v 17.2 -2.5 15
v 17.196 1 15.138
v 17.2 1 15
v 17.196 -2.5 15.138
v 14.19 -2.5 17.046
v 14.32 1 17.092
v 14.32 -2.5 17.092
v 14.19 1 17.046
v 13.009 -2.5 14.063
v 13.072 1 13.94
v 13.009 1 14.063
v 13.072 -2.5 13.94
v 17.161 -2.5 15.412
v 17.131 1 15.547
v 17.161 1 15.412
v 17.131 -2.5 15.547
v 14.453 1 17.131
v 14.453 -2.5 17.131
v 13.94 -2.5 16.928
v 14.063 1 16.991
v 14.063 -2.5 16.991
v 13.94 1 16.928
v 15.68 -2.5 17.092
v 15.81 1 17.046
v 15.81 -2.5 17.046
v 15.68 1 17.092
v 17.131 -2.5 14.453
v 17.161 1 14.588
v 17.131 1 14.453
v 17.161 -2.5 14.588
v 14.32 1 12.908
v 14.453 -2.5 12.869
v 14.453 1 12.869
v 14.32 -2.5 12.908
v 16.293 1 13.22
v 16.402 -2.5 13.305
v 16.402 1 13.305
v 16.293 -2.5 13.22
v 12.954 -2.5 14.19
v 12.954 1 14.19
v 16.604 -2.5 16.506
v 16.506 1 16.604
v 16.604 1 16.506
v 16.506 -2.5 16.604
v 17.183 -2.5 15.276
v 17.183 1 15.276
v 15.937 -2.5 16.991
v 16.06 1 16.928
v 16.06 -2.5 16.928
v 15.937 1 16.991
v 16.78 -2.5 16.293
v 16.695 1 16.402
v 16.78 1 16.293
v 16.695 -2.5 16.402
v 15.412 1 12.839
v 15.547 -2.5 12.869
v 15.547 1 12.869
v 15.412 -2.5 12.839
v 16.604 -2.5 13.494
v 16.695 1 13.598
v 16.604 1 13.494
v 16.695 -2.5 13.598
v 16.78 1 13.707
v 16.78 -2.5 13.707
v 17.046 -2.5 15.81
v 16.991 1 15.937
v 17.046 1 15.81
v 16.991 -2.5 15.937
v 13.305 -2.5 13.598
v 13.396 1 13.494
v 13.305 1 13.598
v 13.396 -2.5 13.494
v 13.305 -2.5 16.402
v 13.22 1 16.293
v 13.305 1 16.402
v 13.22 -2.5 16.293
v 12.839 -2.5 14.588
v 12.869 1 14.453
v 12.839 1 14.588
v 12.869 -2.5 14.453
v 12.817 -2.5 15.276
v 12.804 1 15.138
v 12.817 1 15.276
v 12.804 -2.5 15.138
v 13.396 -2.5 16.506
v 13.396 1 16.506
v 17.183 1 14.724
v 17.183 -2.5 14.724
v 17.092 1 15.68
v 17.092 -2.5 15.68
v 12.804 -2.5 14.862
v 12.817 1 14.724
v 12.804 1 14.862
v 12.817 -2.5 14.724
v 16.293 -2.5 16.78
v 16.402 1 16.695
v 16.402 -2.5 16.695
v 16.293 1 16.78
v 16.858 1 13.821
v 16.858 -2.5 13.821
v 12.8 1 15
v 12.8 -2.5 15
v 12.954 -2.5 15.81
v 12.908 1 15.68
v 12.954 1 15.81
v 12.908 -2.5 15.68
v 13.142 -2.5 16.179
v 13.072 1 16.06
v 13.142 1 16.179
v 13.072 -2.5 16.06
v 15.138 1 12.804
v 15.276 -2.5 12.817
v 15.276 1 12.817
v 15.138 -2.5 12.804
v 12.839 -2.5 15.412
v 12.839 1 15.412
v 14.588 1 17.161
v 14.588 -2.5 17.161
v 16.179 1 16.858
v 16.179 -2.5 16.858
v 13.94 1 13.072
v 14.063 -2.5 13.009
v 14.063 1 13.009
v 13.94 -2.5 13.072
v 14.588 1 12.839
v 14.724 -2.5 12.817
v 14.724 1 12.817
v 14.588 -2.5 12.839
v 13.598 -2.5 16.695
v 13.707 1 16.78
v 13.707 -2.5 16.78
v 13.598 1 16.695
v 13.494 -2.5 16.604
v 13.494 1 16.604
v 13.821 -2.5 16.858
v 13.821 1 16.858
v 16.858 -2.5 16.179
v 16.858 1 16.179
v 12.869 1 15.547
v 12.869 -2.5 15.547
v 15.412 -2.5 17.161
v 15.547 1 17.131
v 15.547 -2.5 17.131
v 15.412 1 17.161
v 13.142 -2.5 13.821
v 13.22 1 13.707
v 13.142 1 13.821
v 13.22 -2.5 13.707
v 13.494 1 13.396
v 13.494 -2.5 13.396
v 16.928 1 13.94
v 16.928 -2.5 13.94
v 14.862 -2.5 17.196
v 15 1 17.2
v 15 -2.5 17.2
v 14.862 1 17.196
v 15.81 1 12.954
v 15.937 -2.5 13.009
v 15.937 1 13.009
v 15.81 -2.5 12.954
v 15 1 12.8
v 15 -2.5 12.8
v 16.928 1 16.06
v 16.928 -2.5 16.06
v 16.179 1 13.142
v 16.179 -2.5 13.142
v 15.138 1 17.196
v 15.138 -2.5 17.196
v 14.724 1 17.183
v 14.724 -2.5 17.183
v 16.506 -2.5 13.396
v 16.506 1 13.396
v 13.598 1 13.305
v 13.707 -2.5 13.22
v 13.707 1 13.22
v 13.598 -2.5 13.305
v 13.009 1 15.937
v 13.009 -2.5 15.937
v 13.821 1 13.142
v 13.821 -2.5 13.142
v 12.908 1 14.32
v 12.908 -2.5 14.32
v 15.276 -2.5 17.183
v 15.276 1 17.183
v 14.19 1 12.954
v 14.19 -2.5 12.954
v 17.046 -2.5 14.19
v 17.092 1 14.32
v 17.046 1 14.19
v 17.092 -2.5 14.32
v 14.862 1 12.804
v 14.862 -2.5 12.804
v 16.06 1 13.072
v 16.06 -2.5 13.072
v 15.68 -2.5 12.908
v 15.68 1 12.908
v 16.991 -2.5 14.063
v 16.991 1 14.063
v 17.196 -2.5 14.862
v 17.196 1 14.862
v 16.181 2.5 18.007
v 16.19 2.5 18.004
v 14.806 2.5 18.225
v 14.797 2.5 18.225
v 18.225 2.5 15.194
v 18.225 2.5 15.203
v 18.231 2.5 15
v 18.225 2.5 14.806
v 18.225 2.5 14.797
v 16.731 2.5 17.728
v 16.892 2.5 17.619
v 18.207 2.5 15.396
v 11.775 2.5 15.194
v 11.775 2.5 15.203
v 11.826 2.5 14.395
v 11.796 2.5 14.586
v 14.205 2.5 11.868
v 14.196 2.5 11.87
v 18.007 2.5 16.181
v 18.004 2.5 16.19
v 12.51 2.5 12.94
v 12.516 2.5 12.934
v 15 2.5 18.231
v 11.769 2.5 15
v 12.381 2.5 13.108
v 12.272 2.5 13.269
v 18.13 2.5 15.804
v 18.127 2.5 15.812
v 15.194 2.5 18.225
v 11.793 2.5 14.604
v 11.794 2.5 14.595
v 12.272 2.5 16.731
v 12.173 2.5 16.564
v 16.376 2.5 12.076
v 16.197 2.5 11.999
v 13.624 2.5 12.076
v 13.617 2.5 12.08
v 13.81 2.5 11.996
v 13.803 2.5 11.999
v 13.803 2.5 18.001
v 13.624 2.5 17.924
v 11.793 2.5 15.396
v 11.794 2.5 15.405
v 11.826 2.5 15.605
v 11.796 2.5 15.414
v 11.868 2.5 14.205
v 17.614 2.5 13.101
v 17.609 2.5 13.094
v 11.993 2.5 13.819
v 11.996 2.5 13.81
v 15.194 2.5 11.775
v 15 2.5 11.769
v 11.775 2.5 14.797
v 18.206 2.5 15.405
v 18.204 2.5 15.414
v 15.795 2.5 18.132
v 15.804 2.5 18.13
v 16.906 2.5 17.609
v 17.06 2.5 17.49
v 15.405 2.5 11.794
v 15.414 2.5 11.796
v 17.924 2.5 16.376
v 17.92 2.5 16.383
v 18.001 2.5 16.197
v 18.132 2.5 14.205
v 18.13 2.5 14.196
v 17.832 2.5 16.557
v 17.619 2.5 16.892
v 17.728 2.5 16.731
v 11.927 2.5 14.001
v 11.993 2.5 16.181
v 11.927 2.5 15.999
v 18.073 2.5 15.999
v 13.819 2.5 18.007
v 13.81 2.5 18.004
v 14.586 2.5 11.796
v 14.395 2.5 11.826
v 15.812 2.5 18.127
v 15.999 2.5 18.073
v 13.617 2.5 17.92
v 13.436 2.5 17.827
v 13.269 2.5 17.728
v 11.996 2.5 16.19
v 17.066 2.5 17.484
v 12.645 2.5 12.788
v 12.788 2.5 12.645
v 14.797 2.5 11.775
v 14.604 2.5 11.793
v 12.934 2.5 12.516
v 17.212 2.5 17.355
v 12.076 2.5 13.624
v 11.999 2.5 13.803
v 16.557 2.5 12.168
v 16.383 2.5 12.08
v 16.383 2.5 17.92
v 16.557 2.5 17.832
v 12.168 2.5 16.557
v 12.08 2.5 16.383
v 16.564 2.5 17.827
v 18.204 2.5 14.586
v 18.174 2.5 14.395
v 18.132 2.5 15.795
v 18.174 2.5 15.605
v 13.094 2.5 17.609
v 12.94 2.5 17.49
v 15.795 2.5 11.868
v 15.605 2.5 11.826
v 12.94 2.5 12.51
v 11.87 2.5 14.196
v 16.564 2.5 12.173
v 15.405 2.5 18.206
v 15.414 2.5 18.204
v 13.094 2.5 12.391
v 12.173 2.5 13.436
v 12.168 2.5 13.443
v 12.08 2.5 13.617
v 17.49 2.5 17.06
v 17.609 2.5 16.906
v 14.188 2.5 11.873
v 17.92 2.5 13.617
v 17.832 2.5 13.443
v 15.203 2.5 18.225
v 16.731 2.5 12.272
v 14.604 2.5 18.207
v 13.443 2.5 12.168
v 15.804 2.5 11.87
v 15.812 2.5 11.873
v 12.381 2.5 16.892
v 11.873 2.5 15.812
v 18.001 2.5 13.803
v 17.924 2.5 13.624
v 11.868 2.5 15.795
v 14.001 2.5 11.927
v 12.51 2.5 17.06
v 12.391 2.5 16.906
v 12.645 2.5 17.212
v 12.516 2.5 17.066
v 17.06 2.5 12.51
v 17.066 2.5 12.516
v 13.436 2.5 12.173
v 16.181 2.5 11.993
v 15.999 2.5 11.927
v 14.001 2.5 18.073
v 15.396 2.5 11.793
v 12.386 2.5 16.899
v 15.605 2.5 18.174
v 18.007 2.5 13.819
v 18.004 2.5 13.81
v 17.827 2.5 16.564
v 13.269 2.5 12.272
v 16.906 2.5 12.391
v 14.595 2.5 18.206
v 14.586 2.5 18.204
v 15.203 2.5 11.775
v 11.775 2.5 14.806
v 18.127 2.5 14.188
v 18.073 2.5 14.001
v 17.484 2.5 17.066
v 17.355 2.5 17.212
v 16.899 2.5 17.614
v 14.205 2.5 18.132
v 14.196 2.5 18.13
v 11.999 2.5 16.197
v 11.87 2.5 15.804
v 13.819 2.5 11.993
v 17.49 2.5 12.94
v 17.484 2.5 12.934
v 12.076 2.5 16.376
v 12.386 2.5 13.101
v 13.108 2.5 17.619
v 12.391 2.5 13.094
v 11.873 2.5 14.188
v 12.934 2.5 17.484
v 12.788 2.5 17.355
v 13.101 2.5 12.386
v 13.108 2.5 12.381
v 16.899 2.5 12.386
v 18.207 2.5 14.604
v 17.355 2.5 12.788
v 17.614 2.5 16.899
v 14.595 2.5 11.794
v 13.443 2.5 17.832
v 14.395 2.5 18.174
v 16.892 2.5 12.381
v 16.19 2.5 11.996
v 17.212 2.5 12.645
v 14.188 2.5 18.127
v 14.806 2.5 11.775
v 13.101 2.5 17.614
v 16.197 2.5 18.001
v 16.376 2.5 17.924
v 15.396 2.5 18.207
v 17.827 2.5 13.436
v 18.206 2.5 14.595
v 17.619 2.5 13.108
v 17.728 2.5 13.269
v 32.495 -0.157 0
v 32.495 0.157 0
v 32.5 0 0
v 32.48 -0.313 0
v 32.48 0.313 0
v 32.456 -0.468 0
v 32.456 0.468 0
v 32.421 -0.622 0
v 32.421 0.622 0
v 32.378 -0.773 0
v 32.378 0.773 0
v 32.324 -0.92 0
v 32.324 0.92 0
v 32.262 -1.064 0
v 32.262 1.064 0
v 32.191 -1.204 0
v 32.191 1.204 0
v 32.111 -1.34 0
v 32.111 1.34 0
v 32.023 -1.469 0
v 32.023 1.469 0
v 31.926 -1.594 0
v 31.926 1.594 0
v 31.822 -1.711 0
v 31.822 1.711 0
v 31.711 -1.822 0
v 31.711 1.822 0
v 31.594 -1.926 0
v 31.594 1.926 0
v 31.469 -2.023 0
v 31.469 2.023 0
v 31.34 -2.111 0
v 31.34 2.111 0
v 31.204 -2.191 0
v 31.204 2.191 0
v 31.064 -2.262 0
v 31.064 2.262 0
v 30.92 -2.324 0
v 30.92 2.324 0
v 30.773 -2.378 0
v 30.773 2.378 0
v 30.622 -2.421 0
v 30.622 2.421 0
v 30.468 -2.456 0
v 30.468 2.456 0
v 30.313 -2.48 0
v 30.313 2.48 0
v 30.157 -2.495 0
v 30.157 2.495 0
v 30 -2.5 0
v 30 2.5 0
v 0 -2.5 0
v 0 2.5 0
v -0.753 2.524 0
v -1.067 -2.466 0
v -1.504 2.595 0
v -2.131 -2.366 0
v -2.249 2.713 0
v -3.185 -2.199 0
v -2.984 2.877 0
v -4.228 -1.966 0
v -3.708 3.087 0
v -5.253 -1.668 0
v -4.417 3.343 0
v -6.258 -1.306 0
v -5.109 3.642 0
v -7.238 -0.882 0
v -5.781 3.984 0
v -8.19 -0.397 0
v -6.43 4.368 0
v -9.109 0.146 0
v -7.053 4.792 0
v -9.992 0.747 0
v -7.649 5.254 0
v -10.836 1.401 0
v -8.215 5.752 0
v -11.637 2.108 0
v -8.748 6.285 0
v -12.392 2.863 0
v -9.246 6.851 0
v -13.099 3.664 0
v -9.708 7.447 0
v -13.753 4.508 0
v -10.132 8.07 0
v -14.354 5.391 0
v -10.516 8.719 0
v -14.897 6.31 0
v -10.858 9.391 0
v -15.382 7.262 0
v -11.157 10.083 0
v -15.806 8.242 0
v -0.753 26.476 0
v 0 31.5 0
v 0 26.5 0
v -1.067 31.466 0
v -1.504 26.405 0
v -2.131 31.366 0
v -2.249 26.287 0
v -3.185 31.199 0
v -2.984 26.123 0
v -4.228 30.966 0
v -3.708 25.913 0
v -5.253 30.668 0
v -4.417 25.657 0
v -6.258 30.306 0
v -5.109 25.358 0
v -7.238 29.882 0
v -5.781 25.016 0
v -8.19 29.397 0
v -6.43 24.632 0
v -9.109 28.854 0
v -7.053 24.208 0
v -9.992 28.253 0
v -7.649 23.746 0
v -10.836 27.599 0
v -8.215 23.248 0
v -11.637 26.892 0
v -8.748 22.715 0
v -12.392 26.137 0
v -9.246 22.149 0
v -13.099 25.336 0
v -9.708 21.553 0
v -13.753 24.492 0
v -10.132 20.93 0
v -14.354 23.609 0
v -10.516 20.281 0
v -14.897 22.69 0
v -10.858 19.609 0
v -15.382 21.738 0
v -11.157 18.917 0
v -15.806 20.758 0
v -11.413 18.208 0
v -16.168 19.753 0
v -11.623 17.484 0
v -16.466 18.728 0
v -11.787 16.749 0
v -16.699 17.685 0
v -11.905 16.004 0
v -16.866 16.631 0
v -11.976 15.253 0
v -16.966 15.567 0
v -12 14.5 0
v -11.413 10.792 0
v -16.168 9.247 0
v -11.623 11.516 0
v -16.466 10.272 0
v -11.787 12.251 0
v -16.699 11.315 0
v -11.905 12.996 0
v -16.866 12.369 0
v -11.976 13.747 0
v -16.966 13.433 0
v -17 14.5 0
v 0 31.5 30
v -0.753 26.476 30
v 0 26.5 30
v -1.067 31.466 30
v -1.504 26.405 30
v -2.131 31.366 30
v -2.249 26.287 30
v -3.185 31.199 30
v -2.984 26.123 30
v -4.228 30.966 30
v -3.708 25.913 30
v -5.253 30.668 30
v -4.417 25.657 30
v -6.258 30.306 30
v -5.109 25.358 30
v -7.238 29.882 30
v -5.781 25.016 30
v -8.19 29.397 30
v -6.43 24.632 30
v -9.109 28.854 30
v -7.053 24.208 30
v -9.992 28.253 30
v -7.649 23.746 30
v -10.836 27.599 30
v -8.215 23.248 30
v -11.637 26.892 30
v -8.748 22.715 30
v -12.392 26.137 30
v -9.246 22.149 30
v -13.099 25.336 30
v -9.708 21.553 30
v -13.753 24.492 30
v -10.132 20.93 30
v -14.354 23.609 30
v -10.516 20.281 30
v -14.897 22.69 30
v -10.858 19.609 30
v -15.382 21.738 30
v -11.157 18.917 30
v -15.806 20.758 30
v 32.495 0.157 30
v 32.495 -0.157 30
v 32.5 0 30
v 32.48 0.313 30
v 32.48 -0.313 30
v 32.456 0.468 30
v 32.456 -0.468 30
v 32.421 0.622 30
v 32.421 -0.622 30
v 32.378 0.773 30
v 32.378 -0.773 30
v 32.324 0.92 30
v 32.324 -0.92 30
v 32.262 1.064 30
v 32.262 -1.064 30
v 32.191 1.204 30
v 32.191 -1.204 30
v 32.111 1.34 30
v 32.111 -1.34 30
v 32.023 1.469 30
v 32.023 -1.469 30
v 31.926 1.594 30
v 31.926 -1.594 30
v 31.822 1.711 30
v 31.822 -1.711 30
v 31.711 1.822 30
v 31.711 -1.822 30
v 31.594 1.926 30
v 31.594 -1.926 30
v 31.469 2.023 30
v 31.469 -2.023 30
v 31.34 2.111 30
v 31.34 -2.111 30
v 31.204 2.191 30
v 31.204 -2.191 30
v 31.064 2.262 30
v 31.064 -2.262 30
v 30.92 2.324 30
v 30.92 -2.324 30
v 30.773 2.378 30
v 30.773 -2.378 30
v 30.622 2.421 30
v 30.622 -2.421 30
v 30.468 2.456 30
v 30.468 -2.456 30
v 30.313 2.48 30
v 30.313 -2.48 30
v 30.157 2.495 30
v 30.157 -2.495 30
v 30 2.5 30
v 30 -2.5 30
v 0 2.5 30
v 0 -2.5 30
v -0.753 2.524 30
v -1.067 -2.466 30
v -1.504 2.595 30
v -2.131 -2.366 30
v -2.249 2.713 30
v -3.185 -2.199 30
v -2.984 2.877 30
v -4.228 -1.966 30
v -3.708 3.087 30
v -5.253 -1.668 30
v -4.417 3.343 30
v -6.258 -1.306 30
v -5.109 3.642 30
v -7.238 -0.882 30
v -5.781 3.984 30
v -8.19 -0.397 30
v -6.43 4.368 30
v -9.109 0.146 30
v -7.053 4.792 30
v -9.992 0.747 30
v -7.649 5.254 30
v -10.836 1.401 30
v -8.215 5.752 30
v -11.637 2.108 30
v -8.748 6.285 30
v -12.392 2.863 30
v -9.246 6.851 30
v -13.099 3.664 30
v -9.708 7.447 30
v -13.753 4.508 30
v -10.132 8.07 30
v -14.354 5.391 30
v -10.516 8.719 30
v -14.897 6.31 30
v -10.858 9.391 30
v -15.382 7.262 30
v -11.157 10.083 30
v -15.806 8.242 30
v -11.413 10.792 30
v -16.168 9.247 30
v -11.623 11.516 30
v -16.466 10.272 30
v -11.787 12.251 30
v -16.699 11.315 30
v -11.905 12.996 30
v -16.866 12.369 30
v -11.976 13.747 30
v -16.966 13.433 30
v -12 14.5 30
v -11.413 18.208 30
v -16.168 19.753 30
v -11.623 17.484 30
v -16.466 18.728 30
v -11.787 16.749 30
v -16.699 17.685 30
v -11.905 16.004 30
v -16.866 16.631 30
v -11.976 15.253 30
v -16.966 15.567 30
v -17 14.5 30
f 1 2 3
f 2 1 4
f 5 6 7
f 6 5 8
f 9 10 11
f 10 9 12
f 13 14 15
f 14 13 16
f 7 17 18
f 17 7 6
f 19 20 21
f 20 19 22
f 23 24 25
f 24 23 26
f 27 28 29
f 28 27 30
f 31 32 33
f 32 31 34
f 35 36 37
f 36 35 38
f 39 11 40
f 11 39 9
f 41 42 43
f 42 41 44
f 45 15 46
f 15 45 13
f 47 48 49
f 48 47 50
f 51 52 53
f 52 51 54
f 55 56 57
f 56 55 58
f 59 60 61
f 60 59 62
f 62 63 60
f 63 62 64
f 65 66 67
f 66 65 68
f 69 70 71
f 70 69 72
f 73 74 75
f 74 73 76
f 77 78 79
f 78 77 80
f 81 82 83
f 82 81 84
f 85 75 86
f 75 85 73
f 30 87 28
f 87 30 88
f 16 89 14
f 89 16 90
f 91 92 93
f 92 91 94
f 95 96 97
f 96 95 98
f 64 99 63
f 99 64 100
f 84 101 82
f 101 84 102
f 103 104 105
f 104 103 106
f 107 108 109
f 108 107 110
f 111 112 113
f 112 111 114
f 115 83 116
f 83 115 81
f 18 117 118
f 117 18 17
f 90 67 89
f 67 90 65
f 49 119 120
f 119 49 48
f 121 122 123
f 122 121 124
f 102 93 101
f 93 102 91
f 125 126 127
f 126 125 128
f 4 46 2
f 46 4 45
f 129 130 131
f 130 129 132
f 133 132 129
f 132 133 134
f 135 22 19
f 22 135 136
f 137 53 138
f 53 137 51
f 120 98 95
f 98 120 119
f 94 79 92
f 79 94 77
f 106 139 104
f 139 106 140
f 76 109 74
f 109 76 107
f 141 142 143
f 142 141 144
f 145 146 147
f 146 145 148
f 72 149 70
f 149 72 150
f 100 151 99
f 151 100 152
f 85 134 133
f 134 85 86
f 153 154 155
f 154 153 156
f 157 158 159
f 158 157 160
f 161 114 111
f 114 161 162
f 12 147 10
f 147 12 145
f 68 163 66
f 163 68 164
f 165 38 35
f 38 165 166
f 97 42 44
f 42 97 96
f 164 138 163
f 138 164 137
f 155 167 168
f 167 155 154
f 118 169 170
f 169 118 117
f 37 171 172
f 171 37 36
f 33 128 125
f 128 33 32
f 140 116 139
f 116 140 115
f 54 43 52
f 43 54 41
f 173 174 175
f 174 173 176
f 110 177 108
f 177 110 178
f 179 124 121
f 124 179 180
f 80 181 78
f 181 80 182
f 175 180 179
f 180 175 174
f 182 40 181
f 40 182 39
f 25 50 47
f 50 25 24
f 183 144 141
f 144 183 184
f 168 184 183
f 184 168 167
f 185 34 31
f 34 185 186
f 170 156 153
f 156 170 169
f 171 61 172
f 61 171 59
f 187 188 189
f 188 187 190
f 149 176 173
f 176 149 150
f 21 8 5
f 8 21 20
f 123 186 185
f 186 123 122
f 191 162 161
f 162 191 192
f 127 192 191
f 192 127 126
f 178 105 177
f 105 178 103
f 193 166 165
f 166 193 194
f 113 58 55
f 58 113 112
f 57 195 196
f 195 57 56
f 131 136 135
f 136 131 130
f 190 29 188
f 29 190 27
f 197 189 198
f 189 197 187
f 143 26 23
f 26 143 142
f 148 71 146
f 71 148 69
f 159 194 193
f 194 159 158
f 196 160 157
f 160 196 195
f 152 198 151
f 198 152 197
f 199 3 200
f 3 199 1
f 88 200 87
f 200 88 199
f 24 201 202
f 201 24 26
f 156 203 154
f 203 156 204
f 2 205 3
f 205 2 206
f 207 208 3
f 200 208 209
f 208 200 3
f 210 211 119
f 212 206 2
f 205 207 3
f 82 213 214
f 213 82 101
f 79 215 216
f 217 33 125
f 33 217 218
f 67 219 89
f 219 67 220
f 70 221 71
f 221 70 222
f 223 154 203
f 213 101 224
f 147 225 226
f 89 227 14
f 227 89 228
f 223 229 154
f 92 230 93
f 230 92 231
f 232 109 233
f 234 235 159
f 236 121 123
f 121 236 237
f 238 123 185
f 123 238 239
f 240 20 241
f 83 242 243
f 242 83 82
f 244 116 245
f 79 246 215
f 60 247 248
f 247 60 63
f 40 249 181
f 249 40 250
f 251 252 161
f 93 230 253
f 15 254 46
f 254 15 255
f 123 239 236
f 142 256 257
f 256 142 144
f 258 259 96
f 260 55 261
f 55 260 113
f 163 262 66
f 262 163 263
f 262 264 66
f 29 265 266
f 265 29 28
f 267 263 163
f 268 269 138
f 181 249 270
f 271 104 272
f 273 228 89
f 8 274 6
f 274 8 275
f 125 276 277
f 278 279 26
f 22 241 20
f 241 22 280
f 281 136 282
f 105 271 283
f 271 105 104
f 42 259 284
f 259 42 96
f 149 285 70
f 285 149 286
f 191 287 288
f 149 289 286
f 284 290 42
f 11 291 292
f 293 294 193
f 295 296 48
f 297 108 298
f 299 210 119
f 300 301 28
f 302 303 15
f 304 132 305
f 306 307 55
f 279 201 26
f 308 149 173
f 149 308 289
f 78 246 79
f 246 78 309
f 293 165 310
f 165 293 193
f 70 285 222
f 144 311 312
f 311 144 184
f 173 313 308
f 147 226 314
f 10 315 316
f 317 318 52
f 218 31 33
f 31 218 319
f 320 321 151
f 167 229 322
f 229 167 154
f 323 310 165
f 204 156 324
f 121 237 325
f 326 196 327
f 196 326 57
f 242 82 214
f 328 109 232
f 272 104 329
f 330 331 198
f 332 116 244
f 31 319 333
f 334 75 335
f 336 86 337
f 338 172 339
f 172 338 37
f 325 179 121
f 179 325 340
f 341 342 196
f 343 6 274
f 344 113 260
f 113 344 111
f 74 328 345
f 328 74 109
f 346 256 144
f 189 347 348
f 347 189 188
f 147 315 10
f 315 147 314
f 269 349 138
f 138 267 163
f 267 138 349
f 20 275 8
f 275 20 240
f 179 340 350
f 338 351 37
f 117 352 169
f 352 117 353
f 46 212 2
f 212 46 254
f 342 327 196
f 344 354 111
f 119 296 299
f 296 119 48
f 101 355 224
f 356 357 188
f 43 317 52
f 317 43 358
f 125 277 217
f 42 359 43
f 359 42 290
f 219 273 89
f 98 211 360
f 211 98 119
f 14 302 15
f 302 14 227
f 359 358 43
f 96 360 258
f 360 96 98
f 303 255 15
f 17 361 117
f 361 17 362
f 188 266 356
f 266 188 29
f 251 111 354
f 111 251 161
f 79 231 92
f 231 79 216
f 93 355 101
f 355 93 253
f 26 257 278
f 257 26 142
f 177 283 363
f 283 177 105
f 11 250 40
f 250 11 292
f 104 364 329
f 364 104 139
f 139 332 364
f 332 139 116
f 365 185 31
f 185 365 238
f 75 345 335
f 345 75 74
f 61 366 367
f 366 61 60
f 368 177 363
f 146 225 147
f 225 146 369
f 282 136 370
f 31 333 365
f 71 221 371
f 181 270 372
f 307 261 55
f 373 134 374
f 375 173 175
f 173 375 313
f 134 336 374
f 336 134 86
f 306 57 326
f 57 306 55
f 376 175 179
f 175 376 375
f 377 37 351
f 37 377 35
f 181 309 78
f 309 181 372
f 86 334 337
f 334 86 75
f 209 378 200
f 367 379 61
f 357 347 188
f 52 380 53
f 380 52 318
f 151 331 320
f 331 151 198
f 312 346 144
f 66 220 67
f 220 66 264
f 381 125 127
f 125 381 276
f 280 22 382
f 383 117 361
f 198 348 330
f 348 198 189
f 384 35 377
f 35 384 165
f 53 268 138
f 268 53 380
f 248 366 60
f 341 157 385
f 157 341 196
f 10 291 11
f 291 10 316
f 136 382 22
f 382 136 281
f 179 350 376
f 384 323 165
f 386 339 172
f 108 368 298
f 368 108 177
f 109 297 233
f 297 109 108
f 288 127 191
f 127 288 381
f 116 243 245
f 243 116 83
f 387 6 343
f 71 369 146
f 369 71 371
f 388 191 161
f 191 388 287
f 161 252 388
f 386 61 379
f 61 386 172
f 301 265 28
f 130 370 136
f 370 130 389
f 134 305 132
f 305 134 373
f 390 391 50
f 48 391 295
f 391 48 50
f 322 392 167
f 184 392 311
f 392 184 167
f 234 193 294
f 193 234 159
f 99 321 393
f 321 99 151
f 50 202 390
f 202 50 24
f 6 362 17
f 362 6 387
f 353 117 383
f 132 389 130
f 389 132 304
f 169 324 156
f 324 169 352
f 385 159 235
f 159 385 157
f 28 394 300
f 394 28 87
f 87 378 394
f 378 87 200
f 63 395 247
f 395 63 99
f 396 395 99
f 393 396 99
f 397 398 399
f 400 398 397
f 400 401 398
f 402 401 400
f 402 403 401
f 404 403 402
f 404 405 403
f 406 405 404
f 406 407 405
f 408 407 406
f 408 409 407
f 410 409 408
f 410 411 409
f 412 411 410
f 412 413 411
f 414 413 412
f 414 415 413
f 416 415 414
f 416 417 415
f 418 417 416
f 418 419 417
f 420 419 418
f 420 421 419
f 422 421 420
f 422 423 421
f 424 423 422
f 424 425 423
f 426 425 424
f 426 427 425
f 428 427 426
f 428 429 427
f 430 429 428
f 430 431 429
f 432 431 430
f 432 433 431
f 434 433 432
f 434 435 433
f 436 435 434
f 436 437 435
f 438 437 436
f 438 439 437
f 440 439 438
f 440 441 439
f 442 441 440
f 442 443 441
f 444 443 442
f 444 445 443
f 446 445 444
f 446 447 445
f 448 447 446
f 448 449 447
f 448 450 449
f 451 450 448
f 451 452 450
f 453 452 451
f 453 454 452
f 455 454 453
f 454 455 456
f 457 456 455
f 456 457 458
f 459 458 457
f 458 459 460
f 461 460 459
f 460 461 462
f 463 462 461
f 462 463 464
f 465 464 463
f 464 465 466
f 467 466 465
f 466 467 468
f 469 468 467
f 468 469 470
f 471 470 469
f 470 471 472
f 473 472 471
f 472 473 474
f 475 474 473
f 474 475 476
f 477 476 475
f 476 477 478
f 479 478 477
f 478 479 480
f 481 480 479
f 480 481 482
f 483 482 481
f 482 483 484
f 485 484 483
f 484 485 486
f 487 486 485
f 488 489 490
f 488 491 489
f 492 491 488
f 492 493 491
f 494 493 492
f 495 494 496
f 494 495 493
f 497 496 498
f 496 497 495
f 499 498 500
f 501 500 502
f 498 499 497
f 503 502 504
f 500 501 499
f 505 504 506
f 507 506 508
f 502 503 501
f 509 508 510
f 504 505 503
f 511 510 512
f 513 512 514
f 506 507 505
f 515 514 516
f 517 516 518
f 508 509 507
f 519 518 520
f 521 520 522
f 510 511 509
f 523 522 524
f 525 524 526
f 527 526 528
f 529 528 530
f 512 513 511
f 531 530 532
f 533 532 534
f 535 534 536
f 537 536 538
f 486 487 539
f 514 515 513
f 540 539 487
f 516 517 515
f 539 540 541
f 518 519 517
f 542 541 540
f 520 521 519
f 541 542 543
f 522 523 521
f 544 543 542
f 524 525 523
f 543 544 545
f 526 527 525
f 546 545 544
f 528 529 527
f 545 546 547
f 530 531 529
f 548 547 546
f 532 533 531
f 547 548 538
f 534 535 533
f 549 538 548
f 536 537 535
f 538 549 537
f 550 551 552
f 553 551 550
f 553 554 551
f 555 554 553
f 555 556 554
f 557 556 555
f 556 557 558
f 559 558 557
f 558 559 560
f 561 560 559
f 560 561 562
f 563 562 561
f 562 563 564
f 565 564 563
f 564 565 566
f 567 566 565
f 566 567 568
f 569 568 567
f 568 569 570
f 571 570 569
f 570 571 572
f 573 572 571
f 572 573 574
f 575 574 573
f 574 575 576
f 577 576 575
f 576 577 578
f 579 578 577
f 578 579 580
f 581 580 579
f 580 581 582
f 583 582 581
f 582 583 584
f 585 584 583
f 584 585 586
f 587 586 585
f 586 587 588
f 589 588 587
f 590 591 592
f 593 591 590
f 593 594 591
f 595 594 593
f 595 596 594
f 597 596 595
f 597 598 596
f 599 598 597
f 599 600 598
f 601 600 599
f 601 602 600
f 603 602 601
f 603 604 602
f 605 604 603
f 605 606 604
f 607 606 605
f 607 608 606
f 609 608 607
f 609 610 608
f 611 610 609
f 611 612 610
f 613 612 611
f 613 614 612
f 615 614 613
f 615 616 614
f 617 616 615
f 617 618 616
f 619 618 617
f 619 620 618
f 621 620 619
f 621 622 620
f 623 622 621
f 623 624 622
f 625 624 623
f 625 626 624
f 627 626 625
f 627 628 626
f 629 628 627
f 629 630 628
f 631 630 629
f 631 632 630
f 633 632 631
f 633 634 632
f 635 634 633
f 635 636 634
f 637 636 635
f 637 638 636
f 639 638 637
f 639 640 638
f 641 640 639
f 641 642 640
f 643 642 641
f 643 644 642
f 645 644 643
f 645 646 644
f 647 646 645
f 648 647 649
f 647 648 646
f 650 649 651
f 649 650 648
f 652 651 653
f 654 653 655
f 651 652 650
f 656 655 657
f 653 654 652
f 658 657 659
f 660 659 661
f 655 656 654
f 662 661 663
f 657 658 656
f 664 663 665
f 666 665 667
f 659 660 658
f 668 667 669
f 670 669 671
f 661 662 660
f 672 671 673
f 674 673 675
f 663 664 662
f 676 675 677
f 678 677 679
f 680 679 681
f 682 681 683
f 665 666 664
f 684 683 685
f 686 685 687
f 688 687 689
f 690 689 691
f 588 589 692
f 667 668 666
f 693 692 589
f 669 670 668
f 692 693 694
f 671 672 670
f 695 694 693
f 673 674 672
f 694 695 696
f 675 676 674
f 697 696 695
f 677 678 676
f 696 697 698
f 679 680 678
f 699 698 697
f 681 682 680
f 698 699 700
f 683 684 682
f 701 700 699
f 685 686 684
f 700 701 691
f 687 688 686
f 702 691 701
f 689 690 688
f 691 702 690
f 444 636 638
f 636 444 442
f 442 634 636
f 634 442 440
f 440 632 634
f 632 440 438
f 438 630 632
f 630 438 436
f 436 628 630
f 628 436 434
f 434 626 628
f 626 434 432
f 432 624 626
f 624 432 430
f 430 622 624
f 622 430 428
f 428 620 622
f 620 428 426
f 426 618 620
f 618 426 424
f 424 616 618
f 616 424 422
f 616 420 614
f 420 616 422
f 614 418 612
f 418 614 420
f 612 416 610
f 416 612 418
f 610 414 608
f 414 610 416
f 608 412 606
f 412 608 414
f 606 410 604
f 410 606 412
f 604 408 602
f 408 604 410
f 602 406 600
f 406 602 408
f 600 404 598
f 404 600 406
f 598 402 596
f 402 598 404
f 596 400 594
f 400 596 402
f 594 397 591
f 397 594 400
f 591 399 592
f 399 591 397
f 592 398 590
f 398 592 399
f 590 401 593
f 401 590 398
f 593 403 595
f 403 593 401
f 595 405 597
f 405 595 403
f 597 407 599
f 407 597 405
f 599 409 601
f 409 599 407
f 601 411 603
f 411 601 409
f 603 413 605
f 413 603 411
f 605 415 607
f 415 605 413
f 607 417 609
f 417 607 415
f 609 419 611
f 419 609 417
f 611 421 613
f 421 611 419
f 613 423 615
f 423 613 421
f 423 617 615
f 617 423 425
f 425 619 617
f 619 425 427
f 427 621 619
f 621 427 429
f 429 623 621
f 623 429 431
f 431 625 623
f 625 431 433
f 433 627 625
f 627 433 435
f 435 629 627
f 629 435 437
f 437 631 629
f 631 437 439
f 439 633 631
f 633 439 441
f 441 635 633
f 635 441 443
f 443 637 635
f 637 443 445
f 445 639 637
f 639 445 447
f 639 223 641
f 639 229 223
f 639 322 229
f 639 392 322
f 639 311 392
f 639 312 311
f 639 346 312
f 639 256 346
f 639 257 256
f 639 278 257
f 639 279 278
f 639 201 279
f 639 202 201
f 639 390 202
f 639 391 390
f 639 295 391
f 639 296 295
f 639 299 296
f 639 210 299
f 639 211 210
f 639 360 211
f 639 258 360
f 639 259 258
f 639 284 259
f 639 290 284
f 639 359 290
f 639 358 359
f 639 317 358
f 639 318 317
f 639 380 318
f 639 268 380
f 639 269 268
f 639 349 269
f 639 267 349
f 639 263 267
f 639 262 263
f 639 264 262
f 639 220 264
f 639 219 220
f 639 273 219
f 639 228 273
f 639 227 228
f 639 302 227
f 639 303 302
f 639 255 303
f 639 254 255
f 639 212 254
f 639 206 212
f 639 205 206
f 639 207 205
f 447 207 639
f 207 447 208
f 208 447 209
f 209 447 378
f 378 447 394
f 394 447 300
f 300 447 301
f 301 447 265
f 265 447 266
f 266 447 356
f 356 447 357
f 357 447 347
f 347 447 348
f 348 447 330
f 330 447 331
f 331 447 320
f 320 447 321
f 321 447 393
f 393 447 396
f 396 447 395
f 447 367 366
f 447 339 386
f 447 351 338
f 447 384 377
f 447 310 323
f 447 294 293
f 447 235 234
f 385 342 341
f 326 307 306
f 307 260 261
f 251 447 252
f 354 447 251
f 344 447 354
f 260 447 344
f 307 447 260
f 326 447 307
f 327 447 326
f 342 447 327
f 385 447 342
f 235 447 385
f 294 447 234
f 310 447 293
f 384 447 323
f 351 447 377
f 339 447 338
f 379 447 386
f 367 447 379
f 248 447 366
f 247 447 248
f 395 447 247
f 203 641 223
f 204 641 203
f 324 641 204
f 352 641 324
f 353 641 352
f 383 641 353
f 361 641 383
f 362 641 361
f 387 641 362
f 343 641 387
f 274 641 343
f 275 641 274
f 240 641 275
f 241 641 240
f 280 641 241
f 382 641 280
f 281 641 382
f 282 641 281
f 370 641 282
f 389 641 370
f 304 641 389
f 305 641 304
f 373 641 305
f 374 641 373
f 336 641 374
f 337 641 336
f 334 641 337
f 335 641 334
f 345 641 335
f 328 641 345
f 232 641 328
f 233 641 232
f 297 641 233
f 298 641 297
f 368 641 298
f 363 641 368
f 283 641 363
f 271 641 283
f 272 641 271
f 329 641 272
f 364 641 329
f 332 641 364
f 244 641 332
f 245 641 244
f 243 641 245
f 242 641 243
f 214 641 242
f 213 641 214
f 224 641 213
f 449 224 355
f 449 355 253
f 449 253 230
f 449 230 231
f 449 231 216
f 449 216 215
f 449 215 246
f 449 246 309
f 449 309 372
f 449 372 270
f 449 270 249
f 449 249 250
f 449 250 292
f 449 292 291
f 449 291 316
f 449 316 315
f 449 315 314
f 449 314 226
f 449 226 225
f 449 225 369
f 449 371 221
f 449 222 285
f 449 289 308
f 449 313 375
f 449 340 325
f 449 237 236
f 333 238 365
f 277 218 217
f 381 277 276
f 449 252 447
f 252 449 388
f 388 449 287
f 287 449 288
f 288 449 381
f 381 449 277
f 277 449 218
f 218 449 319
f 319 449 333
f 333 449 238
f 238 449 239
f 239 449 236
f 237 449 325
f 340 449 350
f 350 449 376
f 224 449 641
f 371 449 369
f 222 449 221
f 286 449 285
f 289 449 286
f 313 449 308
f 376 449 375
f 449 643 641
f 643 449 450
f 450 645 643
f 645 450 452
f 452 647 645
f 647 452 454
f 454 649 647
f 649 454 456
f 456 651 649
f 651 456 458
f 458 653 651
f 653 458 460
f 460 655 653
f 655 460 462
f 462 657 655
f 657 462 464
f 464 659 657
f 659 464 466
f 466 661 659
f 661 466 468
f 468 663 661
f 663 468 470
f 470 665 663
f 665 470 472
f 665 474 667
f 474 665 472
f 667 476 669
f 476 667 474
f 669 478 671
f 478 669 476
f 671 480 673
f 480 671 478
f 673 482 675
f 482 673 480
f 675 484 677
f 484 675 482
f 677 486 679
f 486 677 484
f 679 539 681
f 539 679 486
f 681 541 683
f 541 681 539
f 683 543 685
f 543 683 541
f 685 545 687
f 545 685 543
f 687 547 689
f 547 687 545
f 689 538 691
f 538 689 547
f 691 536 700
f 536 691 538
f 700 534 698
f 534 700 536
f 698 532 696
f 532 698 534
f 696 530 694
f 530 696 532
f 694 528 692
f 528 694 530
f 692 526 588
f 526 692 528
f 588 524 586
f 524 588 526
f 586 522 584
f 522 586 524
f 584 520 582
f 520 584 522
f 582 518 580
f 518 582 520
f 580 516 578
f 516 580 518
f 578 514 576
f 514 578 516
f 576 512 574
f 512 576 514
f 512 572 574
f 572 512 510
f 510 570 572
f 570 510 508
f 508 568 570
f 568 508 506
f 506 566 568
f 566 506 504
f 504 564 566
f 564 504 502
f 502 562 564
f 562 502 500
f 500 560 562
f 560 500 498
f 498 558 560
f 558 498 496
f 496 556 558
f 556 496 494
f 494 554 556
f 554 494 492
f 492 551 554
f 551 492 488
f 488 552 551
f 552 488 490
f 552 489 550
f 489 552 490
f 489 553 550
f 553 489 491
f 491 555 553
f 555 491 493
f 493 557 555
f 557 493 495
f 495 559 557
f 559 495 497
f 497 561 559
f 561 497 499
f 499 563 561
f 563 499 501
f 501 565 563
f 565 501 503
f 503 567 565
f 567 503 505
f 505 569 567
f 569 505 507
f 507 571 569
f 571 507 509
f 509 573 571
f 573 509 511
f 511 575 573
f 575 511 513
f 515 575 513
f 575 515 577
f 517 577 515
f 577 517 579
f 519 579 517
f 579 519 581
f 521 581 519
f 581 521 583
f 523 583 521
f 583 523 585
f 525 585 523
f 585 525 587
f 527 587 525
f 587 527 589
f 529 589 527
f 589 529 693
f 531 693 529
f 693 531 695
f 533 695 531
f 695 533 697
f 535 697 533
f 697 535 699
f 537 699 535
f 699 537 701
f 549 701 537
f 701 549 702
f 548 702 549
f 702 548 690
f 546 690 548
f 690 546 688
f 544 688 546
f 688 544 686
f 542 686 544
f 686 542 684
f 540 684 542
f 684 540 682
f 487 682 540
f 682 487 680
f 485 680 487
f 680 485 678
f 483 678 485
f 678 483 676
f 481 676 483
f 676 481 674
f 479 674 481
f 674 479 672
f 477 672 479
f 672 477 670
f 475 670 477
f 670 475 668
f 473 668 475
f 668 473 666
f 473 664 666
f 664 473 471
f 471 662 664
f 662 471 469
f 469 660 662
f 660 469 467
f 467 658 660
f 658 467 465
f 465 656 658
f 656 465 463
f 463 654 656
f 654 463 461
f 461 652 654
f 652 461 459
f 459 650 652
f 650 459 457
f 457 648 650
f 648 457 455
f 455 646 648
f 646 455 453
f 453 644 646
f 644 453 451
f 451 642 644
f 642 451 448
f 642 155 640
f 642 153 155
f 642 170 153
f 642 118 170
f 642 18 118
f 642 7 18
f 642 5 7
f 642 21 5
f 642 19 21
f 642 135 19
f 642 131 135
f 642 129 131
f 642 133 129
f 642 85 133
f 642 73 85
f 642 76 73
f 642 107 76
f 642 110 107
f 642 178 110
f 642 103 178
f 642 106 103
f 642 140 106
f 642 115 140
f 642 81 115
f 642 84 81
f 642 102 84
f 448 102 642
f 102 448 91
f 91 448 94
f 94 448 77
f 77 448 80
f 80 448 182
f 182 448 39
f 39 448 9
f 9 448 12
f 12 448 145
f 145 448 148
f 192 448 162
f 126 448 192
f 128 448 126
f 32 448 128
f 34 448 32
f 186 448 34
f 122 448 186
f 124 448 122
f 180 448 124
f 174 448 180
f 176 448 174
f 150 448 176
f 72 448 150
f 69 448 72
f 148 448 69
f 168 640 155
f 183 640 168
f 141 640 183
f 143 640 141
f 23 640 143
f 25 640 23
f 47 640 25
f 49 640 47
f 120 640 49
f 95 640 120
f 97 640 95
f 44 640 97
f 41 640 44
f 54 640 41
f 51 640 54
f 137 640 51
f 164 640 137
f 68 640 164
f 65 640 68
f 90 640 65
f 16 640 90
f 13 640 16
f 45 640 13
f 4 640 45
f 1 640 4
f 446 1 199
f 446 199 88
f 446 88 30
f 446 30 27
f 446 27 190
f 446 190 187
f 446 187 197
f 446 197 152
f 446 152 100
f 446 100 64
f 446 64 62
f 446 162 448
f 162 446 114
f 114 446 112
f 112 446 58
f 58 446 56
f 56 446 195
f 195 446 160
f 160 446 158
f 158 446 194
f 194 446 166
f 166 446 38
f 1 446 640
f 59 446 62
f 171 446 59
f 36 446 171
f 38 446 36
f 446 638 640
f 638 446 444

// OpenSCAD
$fn=100;

thickness = 5;
pole_radius = 12;
screw_hole_radius = 2.2;

difference () {
  linear_extrude (30) {
    hull () {
      circle (thickness/2);
      translate ([30,0,0]) circle (thickness/2);
    }
    translate ([0,pole_radius + thickness/2,0])
    difference () {
      circle (pole_radius + thickness);
      circle (pole_radius);
      translate ([0,-50,0]) square (100);
    }
  }
  
  translate ([15, 0, 15]) rotate ([270,0,0]) {
    translate ([0,0,-15]) linear_extrude (30)
      circle (screw_hole_radius);
    translate ([0,0,thickness/2 - 1.5])
    linear_extrude (1.6, scale=1.5)
      circle (screw_hole_radius);
  }
}
